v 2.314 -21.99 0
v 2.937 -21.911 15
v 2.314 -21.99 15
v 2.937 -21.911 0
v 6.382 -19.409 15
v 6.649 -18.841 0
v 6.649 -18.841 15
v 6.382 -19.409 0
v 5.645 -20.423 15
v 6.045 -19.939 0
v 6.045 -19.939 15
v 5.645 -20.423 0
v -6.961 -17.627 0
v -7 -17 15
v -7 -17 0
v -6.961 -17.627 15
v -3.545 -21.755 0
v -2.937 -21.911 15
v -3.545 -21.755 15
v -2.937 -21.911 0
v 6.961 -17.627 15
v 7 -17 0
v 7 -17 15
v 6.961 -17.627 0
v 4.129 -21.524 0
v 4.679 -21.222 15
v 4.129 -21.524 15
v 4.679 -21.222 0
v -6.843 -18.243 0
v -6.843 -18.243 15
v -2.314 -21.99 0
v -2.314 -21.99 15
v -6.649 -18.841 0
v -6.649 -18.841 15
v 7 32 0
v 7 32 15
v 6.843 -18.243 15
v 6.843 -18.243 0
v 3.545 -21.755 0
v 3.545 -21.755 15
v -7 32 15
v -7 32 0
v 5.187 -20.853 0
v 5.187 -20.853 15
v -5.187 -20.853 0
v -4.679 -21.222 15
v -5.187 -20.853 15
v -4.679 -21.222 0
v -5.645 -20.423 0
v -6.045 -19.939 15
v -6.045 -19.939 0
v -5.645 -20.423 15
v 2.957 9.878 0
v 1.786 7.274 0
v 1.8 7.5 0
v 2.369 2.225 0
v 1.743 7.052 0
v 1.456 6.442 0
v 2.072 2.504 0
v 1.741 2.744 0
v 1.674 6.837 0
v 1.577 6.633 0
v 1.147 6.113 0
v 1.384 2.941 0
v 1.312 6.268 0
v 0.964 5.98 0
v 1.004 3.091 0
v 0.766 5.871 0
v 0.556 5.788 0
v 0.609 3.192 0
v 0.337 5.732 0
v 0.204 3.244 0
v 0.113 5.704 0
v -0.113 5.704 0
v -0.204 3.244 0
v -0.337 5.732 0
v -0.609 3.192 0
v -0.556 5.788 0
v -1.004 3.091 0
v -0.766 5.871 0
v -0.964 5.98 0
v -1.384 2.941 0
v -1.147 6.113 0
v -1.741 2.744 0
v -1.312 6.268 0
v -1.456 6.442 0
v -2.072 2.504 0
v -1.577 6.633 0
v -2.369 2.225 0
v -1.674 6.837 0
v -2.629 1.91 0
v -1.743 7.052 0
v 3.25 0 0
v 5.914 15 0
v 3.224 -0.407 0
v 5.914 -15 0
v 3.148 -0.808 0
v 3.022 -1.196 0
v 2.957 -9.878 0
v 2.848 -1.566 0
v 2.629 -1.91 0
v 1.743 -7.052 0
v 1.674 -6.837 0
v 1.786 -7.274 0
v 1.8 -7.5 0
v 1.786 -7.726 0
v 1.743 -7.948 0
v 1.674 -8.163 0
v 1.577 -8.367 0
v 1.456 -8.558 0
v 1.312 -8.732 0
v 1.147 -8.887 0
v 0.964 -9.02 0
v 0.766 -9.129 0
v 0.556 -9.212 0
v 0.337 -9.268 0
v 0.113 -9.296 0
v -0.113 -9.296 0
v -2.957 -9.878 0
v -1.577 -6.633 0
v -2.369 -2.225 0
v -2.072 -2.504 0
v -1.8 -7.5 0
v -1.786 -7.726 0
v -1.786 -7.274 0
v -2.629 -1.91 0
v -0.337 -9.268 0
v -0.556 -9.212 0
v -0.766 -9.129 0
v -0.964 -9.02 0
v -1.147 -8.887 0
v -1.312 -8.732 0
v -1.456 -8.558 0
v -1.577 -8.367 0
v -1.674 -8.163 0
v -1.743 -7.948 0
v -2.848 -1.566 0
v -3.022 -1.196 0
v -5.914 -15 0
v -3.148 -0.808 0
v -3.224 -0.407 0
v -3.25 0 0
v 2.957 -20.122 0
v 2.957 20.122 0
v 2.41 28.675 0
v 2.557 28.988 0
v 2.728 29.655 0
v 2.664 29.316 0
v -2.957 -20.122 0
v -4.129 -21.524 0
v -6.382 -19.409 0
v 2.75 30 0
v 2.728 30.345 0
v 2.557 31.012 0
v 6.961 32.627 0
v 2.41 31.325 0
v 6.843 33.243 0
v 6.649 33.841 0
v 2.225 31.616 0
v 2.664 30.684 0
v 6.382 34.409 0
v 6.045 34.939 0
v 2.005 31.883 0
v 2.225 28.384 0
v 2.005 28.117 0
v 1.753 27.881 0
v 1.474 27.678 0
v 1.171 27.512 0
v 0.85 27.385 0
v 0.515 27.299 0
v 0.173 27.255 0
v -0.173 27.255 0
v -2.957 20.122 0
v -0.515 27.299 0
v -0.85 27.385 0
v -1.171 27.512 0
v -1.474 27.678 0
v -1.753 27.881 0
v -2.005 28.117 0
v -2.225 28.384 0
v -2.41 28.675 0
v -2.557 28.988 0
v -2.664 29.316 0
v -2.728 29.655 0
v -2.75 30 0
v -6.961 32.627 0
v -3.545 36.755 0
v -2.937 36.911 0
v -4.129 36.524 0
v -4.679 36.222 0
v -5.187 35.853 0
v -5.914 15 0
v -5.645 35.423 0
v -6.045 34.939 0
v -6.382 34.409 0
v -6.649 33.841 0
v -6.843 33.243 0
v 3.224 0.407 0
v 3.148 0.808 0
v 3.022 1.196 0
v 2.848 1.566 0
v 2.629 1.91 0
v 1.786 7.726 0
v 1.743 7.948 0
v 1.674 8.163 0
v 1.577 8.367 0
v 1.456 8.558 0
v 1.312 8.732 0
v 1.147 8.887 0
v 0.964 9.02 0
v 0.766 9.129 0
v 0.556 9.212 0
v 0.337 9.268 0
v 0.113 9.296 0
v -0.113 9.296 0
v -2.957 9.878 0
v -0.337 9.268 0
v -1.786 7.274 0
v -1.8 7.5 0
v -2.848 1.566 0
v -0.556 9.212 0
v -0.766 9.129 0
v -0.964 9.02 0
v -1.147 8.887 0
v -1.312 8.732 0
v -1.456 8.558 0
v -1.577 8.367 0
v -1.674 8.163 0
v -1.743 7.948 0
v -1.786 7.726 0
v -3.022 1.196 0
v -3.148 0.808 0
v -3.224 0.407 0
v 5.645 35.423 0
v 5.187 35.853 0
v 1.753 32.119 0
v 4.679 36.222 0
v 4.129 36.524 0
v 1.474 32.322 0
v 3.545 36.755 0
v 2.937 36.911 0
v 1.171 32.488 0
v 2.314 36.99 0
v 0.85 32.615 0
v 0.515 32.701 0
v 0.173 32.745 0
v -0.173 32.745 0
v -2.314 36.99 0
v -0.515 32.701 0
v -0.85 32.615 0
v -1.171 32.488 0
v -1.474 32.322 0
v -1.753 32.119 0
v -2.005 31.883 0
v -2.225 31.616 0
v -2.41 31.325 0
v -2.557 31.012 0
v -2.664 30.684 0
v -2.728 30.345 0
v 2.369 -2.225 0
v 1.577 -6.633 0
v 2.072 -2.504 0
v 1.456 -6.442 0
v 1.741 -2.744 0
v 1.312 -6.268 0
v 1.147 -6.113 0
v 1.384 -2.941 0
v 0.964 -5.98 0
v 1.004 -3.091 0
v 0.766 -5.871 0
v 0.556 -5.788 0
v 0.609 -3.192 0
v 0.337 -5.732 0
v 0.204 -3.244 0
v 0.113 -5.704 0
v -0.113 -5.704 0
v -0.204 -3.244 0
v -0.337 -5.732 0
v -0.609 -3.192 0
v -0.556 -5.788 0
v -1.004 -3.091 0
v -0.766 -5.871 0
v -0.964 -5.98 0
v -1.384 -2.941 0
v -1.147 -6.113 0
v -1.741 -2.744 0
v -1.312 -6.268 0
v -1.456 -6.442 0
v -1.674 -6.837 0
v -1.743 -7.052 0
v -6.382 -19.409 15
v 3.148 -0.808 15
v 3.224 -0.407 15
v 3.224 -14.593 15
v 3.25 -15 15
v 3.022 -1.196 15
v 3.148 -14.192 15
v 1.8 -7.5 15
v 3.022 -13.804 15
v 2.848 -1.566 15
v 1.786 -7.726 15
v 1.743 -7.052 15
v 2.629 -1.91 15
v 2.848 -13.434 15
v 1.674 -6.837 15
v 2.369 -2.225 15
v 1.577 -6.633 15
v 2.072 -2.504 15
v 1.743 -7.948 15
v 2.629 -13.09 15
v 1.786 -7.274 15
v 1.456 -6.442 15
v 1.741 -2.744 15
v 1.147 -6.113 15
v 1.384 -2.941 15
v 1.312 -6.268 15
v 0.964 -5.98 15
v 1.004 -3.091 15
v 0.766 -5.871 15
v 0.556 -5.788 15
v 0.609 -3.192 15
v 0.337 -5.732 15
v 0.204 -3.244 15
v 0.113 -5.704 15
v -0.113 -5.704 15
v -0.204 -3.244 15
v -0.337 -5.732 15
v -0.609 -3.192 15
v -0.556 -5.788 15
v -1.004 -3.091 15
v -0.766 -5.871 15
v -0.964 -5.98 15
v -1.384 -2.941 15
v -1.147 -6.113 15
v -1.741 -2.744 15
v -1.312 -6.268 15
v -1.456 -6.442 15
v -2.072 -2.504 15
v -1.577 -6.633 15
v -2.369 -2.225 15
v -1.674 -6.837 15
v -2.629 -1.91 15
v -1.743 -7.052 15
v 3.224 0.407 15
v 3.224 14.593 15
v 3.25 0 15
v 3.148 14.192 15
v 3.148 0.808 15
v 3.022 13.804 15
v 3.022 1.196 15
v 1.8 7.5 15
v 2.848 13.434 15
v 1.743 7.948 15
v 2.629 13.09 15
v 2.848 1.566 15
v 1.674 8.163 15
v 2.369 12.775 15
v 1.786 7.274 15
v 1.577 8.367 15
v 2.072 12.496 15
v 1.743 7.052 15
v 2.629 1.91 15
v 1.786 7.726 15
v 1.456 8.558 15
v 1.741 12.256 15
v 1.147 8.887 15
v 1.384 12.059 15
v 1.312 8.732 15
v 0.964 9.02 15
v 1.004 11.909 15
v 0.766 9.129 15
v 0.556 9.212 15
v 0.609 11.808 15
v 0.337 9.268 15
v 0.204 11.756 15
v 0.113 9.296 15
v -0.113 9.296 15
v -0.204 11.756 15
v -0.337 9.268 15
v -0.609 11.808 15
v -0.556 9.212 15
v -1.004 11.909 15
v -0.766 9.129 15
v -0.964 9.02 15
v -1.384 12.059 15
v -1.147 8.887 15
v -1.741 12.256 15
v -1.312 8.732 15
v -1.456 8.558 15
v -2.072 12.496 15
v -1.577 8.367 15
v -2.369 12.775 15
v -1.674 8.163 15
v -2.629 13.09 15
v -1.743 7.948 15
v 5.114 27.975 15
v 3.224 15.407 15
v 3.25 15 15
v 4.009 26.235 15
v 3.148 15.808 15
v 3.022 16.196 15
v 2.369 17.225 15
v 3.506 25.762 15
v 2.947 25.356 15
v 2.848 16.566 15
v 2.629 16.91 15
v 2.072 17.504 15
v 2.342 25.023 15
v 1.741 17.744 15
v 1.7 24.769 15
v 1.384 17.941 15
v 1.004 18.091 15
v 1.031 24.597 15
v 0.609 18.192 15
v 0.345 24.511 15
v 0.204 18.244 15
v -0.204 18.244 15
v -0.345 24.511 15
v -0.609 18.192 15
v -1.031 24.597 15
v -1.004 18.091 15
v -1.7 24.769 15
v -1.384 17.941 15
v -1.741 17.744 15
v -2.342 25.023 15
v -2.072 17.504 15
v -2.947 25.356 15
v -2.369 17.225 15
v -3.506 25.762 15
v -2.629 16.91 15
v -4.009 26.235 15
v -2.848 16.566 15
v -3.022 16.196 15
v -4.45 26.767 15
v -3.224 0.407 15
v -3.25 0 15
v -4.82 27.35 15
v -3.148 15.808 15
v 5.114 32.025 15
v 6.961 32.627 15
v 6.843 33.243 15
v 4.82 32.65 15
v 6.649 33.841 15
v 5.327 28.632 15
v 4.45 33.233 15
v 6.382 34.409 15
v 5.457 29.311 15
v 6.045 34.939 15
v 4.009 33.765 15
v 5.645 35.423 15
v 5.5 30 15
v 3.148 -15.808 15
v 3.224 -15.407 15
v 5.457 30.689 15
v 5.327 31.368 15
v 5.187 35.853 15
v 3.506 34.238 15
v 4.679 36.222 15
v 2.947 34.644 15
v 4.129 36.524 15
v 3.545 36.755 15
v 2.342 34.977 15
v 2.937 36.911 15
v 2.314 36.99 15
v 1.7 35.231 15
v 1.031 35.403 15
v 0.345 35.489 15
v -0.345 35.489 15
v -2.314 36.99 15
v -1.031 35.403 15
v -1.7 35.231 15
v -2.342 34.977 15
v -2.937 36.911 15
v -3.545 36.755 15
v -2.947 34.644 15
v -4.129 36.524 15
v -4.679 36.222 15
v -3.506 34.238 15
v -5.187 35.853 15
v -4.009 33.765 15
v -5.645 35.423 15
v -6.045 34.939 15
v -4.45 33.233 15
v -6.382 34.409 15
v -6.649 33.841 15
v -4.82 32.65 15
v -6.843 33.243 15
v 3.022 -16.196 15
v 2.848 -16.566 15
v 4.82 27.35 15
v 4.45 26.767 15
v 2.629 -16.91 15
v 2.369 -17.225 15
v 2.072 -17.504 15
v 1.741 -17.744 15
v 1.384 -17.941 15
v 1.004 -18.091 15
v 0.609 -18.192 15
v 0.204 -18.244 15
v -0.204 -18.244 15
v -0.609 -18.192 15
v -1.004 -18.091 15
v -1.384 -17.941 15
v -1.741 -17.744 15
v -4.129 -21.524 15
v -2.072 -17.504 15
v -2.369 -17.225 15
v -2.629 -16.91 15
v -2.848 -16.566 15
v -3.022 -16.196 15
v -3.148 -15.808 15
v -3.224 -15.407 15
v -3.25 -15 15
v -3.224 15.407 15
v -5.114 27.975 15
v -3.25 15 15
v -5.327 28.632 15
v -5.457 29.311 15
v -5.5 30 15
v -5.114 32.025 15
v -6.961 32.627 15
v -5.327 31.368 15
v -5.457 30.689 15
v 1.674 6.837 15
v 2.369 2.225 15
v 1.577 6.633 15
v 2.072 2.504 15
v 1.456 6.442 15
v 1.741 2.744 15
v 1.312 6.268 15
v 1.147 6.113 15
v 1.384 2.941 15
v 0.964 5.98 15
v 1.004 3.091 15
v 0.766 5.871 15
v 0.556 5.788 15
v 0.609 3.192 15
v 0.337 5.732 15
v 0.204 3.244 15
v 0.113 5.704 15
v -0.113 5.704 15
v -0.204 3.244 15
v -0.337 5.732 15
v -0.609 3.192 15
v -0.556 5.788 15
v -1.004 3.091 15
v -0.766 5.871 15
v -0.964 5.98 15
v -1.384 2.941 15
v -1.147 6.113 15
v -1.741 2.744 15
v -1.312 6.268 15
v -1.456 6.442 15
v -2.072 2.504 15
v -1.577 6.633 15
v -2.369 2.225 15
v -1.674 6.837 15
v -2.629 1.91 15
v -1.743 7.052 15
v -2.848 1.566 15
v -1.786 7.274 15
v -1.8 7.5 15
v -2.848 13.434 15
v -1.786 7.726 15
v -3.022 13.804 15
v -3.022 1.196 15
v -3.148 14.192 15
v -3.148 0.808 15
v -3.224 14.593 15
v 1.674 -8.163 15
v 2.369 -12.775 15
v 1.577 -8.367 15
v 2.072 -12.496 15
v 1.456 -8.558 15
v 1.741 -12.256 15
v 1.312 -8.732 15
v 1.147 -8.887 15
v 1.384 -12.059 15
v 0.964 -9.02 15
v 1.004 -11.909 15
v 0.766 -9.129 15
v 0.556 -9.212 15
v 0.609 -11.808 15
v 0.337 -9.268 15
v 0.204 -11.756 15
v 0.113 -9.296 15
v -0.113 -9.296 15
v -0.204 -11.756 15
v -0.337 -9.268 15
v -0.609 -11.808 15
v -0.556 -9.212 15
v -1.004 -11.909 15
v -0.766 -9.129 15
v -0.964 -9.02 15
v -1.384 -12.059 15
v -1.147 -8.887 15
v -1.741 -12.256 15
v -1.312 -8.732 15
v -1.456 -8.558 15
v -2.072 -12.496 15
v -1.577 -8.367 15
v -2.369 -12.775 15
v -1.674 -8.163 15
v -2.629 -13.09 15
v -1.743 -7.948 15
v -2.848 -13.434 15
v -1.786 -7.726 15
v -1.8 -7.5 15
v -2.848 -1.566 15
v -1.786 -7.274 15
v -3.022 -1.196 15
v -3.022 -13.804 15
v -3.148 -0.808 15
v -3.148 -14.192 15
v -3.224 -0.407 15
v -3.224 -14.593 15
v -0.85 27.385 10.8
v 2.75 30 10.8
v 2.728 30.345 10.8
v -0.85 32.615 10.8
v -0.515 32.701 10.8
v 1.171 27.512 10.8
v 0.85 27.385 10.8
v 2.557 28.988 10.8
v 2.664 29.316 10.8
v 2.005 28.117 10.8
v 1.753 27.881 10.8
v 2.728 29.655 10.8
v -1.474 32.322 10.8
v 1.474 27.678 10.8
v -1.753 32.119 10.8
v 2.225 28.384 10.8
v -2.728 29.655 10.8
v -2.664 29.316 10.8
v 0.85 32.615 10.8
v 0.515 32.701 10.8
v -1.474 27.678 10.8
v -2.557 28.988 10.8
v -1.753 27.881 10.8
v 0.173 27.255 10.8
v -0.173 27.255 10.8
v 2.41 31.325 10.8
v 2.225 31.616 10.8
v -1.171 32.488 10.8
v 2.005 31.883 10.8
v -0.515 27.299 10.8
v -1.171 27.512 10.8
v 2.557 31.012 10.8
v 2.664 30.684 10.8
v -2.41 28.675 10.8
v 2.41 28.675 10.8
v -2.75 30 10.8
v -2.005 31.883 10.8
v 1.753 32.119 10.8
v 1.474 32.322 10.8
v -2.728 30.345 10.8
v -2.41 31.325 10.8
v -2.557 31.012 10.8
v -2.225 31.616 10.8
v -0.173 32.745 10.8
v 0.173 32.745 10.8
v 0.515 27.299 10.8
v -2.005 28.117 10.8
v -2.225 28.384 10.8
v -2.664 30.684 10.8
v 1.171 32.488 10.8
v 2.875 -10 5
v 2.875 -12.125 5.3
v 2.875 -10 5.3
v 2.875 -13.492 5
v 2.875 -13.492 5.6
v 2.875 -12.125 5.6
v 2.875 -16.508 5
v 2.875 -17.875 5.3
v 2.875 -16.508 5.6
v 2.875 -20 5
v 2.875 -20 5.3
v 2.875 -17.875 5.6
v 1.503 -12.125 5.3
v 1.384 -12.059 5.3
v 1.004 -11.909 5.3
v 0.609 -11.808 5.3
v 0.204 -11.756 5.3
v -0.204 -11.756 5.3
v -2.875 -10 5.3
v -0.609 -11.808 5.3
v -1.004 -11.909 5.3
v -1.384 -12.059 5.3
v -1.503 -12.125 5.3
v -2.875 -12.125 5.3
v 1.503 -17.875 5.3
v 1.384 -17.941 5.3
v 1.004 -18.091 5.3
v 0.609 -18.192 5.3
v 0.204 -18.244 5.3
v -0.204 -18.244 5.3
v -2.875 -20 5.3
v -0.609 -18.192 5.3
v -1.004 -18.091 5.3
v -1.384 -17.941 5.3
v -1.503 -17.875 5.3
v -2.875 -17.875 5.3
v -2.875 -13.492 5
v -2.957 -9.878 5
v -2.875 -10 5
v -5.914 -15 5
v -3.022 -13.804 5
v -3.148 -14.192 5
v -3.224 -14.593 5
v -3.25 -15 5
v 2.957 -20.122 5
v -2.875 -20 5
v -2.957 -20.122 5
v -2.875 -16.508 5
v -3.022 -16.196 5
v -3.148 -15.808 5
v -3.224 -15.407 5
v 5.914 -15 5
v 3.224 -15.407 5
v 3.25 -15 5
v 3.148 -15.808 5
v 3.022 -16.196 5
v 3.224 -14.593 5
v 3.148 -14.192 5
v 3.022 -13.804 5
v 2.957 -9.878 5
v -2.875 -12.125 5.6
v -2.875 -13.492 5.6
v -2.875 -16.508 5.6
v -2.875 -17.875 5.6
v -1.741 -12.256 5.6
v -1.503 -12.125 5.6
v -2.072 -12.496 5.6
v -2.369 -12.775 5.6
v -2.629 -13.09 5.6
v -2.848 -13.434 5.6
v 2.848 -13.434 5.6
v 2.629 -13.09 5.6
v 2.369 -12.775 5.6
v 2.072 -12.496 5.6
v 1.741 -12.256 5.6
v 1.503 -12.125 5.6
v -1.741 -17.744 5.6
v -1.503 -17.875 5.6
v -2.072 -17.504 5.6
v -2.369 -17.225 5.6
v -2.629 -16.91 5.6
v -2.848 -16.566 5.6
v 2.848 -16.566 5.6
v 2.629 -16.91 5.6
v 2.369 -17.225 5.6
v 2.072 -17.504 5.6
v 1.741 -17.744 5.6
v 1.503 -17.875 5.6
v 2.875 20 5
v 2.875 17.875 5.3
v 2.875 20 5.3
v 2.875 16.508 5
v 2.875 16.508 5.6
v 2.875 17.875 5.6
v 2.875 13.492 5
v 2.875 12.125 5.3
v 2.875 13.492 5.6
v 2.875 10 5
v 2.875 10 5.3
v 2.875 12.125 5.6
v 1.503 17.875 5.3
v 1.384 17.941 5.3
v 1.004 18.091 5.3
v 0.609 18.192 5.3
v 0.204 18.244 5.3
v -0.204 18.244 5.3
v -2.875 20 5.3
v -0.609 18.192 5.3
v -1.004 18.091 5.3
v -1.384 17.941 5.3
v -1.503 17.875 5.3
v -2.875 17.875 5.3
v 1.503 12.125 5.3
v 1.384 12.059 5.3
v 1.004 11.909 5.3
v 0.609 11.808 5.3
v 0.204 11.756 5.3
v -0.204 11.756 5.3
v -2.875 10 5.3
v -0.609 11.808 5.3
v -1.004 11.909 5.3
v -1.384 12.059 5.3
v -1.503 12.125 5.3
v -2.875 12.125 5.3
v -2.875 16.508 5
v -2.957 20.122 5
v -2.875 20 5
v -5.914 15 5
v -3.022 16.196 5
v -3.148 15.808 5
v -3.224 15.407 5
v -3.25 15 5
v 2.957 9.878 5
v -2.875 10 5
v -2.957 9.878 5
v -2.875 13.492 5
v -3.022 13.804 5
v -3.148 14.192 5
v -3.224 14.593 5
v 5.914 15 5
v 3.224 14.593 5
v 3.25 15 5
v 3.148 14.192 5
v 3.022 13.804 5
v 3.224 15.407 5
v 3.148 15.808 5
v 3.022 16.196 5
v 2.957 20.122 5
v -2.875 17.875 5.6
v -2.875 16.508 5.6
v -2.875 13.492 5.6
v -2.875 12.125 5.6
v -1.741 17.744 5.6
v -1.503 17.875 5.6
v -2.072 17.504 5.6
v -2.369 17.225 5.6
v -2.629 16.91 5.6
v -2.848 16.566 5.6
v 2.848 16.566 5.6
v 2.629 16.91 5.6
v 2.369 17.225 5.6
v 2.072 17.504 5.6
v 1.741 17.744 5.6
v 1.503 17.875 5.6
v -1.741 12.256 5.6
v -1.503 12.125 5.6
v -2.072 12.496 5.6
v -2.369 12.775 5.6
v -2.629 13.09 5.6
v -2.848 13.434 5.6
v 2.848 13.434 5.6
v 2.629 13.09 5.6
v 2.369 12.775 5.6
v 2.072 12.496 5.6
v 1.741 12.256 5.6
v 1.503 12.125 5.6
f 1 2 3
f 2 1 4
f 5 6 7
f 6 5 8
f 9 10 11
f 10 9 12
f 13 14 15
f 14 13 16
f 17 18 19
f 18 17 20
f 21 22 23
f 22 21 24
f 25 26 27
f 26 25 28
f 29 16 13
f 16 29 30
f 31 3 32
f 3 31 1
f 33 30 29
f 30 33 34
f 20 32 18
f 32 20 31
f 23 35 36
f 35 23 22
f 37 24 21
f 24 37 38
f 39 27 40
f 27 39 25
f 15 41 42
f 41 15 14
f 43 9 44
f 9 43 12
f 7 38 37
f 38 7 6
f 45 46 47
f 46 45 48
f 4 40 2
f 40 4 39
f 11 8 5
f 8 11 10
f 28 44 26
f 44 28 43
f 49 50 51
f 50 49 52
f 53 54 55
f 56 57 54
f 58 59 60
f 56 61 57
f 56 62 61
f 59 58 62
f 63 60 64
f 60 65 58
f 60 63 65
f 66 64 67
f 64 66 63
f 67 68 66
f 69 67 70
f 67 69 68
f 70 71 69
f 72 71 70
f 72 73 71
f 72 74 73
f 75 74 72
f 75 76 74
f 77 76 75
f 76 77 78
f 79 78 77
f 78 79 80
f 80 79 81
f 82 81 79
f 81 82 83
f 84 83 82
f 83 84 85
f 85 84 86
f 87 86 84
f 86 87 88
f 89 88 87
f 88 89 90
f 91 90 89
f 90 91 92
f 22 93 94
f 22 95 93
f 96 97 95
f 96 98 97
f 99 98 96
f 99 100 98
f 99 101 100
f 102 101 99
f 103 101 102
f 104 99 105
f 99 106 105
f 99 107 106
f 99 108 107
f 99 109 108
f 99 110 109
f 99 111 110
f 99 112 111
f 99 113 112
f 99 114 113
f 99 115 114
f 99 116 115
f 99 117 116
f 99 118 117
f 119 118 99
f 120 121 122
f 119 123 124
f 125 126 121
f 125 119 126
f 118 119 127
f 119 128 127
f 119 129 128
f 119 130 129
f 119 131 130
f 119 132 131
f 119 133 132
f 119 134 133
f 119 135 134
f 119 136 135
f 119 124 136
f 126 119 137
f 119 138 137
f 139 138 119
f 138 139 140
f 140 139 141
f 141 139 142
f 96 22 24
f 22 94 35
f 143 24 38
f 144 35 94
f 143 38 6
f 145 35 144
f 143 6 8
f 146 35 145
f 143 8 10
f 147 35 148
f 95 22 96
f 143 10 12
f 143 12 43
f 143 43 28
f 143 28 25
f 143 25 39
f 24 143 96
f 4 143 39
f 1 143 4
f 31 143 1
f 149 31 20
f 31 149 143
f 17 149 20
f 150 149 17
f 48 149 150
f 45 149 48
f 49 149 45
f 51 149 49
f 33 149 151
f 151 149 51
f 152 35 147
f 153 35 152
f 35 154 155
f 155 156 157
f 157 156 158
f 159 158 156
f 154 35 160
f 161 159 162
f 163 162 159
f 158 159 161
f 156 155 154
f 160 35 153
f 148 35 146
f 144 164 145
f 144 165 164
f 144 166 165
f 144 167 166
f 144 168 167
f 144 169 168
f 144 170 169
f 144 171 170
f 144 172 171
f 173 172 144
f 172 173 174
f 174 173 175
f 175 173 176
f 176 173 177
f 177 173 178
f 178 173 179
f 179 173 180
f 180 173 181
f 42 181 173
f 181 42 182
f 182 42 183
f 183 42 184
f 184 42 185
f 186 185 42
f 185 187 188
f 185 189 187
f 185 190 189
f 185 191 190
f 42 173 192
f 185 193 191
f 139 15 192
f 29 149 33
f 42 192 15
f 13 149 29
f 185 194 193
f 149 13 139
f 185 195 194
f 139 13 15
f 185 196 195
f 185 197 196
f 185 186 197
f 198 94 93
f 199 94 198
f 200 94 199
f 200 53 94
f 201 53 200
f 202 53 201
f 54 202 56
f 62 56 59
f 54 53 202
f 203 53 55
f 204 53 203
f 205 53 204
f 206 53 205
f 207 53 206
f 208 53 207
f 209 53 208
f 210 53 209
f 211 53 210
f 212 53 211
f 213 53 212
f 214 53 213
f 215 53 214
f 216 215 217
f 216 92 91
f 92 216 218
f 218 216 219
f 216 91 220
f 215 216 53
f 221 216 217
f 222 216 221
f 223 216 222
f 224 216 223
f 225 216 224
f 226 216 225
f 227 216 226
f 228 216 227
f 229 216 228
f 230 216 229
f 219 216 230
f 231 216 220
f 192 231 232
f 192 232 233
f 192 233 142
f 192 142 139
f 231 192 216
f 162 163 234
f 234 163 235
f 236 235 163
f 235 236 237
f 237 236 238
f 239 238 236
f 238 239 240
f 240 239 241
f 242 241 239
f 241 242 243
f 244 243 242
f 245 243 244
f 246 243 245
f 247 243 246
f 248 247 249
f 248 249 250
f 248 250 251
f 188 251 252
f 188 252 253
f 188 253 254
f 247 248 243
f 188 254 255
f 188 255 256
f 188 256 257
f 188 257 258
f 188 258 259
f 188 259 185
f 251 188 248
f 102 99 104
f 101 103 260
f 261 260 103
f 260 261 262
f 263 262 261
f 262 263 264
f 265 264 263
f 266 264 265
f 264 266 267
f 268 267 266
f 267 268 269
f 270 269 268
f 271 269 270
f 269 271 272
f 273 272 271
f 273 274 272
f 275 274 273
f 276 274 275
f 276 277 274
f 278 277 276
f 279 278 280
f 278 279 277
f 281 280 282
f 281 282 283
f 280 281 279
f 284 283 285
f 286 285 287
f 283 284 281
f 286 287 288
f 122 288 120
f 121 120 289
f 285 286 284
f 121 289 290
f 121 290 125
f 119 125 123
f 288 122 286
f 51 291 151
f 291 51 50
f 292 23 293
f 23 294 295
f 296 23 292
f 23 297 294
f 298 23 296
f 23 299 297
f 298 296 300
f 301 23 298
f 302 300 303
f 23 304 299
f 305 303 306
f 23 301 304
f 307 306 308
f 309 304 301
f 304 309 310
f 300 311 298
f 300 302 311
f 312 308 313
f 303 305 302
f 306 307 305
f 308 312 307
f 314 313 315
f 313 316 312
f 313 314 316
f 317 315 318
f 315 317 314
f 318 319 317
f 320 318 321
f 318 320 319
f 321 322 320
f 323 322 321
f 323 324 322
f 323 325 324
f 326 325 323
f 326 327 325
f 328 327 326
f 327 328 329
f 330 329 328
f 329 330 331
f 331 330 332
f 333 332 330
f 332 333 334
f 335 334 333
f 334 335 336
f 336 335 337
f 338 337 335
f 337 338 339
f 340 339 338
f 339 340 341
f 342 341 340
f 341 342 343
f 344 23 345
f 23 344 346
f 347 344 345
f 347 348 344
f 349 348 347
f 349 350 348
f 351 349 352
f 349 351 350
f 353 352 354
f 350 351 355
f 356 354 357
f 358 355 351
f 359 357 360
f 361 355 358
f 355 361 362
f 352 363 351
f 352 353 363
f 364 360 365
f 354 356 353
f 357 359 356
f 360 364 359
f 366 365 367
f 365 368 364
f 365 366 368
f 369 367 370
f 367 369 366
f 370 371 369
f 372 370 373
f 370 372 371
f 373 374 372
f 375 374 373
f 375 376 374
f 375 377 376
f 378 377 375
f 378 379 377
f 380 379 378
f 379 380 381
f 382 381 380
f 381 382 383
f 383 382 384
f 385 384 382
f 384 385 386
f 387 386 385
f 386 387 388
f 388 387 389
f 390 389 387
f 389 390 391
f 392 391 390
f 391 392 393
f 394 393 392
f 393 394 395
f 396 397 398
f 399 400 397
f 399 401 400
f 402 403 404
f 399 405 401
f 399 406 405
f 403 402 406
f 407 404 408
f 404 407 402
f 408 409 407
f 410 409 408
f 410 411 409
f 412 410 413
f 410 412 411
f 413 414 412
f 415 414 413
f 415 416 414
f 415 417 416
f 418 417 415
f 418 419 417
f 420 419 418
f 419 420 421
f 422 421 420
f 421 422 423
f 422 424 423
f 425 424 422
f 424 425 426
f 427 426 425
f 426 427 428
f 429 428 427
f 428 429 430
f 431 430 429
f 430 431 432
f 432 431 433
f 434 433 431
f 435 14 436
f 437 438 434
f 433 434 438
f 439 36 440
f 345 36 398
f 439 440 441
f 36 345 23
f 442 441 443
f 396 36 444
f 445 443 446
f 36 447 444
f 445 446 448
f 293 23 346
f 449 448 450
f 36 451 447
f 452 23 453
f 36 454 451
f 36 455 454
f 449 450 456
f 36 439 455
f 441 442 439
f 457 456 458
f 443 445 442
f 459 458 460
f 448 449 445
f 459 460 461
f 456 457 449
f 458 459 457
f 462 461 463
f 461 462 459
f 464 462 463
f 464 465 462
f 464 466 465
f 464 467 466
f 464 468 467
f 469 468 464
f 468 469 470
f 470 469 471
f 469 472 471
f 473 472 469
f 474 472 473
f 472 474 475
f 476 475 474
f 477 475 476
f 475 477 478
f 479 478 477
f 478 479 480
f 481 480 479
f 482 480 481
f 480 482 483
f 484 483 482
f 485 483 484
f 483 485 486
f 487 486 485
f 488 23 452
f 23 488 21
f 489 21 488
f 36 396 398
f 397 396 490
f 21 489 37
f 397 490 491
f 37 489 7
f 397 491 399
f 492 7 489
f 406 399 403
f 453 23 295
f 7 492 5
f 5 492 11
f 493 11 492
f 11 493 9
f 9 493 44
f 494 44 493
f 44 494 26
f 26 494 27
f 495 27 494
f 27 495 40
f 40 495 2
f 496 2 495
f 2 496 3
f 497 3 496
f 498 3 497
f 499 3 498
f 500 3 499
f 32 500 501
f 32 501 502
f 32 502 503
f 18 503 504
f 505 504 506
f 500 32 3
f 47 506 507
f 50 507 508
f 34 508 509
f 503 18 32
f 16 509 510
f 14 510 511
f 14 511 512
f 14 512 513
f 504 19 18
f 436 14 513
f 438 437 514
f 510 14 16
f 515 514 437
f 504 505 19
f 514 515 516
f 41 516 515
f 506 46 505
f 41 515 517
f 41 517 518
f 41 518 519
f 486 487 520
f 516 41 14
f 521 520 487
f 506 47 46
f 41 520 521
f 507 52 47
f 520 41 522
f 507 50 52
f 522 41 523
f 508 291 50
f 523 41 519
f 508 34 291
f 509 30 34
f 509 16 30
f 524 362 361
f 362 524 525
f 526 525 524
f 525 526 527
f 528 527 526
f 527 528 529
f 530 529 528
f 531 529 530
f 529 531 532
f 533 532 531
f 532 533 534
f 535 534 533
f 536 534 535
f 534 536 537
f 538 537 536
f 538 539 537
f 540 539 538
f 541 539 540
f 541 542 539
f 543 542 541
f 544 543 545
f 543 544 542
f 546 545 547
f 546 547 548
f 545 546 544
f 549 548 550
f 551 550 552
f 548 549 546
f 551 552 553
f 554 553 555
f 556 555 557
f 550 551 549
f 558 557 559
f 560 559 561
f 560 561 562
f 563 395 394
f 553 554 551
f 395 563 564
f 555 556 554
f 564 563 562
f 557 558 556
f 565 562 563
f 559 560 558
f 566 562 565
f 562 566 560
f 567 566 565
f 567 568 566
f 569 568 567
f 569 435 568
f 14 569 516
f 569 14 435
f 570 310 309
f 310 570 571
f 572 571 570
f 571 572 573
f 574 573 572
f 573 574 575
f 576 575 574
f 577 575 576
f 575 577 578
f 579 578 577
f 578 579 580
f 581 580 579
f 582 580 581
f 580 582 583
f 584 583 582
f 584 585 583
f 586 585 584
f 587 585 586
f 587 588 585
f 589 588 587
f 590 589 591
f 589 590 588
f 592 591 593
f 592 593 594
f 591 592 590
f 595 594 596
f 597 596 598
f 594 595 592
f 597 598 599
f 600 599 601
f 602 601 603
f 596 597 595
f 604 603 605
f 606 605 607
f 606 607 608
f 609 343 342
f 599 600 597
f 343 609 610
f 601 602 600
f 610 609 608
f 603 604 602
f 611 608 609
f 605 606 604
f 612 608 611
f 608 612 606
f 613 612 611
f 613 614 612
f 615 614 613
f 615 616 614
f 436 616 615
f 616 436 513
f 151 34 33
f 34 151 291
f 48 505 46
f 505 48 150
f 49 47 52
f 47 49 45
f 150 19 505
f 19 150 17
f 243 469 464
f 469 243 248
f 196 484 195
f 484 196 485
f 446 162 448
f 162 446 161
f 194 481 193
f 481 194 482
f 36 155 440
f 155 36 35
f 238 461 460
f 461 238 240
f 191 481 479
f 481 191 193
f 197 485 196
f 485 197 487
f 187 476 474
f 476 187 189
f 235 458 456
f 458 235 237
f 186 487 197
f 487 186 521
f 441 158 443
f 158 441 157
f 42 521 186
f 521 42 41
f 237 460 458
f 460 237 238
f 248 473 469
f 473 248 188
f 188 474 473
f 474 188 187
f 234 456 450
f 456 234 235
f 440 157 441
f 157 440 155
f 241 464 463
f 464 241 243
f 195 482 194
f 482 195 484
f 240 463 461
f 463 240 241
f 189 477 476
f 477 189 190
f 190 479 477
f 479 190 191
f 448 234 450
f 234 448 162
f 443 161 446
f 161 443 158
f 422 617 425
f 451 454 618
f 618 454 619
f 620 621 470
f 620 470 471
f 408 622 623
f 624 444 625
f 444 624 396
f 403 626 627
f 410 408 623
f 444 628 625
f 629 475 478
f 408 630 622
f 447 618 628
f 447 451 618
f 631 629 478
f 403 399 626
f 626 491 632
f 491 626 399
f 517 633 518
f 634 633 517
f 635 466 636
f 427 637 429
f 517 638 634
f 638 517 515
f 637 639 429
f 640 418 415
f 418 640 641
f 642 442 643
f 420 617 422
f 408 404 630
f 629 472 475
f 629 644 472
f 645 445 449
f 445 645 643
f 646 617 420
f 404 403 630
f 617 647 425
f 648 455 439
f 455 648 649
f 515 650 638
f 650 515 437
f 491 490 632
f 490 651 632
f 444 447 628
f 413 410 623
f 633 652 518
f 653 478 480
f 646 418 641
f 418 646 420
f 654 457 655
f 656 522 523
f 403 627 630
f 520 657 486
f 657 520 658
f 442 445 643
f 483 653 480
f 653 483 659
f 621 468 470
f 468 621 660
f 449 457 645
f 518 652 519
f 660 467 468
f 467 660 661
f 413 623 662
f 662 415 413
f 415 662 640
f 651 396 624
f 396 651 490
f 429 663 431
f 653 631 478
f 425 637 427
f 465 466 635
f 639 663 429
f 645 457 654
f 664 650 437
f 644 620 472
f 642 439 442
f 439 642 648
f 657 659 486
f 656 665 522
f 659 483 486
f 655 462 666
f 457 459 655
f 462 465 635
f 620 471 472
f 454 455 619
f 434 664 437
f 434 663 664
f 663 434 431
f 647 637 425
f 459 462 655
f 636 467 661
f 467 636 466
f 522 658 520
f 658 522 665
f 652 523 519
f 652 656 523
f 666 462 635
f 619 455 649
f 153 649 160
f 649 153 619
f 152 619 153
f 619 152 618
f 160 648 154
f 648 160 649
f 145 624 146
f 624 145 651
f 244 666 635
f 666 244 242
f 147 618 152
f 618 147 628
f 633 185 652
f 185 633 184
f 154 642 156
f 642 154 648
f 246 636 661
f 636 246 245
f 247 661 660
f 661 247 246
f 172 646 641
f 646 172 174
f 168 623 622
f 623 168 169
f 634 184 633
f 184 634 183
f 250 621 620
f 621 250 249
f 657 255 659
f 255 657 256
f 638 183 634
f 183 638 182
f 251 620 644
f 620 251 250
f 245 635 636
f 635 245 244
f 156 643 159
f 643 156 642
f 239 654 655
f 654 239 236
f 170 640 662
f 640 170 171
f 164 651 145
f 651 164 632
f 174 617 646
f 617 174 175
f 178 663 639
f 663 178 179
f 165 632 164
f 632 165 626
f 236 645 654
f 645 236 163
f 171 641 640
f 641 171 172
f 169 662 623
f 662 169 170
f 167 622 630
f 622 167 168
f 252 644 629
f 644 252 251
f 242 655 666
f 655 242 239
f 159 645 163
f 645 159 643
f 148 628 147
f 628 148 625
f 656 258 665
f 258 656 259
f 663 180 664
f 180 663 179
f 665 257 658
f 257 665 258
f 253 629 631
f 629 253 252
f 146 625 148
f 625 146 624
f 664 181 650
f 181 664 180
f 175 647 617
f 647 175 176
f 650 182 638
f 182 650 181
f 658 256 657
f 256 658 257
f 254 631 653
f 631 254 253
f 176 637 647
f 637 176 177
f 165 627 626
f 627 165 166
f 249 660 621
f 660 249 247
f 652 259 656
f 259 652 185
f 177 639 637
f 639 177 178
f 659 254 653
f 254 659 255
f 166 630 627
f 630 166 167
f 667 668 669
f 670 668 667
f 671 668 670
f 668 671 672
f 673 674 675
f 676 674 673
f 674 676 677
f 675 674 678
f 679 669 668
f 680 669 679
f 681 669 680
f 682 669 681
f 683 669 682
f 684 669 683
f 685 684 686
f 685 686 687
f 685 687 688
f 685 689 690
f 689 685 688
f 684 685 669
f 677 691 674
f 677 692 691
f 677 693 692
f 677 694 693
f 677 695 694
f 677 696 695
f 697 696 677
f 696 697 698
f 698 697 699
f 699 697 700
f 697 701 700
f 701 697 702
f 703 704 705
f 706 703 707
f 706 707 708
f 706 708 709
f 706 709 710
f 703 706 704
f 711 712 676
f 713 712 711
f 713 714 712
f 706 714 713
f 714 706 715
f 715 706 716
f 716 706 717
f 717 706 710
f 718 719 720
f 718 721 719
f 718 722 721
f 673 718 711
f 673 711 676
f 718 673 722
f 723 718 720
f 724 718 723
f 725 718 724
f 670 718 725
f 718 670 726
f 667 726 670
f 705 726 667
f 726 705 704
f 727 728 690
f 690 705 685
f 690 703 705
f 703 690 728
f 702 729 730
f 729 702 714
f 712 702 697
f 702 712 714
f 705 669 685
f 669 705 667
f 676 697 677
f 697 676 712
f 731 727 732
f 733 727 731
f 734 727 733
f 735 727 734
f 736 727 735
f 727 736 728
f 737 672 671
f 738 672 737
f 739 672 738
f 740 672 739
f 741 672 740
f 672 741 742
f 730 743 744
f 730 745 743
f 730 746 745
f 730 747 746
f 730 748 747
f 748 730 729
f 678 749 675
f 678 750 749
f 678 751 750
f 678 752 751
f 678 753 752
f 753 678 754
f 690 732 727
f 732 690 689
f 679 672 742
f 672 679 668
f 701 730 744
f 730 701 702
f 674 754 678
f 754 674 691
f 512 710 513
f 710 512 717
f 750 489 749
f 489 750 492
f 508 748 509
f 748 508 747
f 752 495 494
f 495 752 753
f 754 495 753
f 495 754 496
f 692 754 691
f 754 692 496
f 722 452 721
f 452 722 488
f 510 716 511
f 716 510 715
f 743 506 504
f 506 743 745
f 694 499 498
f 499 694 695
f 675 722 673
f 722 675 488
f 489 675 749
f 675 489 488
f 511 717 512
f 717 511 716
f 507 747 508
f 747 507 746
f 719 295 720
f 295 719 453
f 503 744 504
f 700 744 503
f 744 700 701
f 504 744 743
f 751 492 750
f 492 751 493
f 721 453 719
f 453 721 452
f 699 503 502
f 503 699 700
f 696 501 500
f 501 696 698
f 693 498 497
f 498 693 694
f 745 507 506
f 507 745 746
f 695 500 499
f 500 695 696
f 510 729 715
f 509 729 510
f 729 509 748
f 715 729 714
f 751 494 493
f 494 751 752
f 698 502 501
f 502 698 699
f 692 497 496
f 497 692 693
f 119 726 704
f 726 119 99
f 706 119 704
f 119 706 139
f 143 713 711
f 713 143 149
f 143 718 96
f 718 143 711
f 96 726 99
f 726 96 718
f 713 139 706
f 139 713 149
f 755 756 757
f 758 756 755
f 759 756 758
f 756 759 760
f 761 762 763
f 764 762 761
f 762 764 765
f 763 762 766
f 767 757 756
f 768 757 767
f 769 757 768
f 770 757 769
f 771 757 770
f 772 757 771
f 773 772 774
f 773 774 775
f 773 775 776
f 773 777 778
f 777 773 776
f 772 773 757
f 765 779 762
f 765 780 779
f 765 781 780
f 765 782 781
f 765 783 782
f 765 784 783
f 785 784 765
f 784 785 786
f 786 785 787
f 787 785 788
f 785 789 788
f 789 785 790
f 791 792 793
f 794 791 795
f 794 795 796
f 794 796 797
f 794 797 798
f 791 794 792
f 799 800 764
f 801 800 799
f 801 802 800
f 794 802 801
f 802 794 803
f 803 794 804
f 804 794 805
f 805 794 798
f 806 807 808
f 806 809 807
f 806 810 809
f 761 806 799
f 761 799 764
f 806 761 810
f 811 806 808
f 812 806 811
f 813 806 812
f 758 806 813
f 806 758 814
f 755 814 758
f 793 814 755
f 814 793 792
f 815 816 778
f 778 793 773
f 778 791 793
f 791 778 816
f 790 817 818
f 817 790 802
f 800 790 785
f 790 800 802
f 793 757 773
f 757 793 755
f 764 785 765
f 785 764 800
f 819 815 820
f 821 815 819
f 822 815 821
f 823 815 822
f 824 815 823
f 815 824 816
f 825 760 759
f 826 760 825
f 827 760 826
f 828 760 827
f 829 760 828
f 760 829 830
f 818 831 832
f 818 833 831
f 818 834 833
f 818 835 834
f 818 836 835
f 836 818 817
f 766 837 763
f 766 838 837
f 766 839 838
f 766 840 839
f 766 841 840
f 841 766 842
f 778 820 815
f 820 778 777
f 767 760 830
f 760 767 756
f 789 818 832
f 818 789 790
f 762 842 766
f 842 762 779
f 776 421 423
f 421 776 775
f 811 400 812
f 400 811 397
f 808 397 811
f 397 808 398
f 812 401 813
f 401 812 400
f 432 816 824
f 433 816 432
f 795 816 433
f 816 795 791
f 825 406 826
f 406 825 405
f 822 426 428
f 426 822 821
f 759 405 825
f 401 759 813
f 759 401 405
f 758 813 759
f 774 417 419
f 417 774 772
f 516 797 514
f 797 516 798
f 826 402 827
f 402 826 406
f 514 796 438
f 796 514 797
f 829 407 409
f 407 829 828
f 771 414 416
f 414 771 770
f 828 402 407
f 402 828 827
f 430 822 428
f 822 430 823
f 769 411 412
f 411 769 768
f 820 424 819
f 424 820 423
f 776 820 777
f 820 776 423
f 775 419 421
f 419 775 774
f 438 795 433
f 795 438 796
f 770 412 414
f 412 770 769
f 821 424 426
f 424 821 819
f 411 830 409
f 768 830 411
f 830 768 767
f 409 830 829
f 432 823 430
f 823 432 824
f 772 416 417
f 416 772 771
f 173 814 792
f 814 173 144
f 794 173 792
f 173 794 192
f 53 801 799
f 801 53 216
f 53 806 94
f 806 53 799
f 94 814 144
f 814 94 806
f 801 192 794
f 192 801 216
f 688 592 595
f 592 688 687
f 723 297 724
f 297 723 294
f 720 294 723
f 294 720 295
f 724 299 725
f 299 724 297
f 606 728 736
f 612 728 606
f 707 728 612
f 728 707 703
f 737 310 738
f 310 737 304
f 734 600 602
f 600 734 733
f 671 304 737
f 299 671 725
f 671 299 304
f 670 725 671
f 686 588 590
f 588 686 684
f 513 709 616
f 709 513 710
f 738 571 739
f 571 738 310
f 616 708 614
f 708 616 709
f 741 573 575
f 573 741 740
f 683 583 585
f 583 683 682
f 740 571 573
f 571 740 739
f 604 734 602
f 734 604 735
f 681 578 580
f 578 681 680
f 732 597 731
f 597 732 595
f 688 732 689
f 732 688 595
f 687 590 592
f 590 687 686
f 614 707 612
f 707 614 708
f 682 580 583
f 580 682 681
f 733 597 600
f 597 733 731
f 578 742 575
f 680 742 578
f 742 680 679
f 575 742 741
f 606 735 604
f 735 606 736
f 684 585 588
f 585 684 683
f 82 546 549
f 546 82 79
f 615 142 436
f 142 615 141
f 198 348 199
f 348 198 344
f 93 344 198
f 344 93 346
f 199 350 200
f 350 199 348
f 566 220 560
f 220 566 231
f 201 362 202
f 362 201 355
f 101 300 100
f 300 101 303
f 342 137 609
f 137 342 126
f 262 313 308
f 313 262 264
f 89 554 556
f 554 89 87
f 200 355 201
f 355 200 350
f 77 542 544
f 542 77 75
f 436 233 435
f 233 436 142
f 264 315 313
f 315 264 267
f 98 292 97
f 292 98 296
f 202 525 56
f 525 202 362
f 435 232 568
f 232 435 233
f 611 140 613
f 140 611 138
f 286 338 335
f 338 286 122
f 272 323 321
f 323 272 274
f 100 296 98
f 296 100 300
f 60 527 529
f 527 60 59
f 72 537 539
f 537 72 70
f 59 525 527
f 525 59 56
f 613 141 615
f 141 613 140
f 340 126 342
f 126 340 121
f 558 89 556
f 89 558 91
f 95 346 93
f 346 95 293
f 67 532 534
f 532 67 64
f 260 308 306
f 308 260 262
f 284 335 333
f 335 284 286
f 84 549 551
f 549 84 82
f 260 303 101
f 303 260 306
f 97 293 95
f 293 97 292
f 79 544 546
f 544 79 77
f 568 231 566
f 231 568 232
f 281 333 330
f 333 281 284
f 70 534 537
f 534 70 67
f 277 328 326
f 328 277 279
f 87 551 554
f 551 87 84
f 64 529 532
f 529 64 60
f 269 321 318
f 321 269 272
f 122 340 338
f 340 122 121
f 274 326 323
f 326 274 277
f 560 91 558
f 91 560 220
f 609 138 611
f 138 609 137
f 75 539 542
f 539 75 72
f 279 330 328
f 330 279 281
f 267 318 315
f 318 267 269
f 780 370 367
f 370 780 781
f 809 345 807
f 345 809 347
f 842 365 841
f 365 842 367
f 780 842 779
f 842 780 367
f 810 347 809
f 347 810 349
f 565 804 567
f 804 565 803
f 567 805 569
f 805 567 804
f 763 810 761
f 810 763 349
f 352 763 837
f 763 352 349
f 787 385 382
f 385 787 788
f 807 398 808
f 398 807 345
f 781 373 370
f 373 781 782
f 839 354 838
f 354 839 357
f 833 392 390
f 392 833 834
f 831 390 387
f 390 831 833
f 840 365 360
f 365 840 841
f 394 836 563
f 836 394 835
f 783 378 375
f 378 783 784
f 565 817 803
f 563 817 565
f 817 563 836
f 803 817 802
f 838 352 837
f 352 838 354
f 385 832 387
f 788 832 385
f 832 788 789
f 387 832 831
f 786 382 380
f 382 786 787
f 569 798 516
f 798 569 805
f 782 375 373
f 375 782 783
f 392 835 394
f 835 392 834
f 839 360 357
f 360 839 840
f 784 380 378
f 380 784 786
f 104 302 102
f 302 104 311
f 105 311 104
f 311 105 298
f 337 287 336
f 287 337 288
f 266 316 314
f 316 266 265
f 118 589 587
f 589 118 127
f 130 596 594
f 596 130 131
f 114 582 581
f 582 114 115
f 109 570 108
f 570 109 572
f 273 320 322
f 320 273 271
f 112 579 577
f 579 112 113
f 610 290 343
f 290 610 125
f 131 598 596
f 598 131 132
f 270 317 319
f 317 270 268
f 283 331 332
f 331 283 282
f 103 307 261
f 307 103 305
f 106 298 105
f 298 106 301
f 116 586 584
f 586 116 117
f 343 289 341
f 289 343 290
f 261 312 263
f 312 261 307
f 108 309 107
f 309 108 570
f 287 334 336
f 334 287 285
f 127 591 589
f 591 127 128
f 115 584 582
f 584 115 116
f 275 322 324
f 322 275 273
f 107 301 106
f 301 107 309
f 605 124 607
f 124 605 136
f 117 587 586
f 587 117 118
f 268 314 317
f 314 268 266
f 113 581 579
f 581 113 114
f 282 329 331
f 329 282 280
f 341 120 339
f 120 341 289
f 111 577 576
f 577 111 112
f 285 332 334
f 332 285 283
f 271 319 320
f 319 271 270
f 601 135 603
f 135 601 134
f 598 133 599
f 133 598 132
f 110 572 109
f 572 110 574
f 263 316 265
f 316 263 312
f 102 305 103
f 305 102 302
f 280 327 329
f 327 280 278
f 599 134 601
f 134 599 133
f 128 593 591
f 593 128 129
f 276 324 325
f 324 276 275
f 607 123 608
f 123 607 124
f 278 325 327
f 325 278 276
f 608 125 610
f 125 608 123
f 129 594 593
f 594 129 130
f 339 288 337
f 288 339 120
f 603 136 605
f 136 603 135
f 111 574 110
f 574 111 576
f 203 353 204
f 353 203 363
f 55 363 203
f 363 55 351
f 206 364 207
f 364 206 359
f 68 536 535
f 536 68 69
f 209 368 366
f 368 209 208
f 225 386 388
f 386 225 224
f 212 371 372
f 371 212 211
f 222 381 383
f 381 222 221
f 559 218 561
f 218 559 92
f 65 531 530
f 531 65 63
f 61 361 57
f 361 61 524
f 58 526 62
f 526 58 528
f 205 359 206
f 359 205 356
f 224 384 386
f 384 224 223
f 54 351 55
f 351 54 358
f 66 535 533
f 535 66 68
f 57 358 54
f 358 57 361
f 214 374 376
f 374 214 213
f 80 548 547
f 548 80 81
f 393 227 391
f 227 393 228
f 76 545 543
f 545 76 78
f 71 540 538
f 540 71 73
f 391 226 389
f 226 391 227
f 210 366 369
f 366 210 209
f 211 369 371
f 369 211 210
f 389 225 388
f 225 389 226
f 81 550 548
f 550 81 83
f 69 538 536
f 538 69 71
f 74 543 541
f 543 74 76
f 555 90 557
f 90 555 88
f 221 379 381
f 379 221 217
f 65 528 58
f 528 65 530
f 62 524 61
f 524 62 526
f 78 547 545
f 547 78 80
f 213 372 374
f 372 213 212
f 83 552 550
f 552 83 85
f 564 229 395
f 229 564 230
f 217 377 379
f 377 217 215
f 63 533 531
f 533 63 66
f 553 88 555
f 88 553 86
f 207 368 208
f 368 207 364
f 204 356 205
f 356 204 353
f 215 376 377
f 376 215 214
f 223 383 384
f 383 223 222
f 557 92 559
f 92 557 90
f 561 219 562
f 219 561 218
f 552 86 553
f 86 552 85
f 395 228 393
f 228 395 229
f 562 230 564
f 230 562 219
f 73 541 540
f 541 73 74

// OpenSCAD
$fn = 50;


difference() {
	union() {
		hull() {
			translate(v = [-2.0000000000, 17.0000000000, 0]) {
				cylinder(h = 15, r = 5);
			}
			translate(v = [2.0000000000, 17.0000000000, 0]) {
				cylinder(h = 15, r = 5);
			}
			translate(v = [-2.0000000000, -17.0000000000, 0]) {
				cylinder(h = 15, r = 5);
			}
			translate(v = [2.0000000000, -17.0000000000, 0]) {
				cylinder(h = 15, r = 5);
			}
		}
		translate(v = [0.0000000000, 22.5000000000, 0]) {
			hull() {
				translate(v = [-2.0000000000, 9.5000000000, 0]) {
					cylinder(h = 15, r = 5);
				}
				translate(v = [2.0000000000, 9.5000000000, 0]) {
					cylinder(h = 15, r = 5);
				}
				translate(v = [-2.0000000000, -9.5000000000, 0]) {
					cylinder(h = 15, r = 5);
				}
				translate(v = [2.0000000000, -9.5000000000, 0]) {
					cylinder(h = 15, r = 5);
				}
			}
		}
		translate(v = [0.0000000000, 22.5000000000, 0]) {
			hull() {
				translate(v = [-2.0000000000, 9.5000000000, 0]) {
					cylinder(h = 15, r = 5);
				}
				translate(v = [2.0000000000, 9.5000000000, 0]) {
					cylinder(h = 15, r = 5);
				}
				translate(v = [-2.0000000000, -9.5000000000, 0]) {
					cylinder(h = 15, r = 5);
				}
				translate(v = [2.0000000000, -9.5000000000, 0]) {
					cylinder(h = 15, r = 5);
				}
			}
		}
	}
	union() {
		translate(v = [0.0000000000, 30.0000000000, 15]) {
			rotate(a = [0, 0, 0]) {
				difference() {
					union() {
						#translate(v = [0, 0, -15.0000000000]) {
							cylinder(h = 15, r = 2.2500000000);
						}
						#translate(v = [0, 0, -4.2000000000]) {
							cylinder(h = 4.2000000000, r1 = 2.7500000000, r2 = 5.5000000000);
						}
						#translate(v = [0, 0, -15.0000000000]) {
							cylinder(h = 15, r = 2.7500000000);
						}
						#translate(v = [0, 0, -15.0000000000]) {
							cylinder(h = 15, r = 2.2500000000);
						}
					}
					union();
				}
			}
		}
		translate(v = [0.0000000000, 30.0000000000, 15]) {
			rotate(a = [0, 0, 0]) {
				difference() {
					union() {
						#translate(v = [0, 0, -15.0000000000]) {
							cylinder(h = 15, r = 2.2500000000);
						}
						#translate(v = [0, 0, -4.2000000000]) {
							cylinder(h = 4.2000000000, r1 = 2.7500000000, r2 = 5.5000000000);
						}
						#translate(v = [0, 0, -15.0000000000]) {
							cylinder(h = 15, r = 2.7500000000);
						}
						#translate(v = [0, 0, -15.0000000000]) {
							cylinder(h = 15, r = 2.2500000000);
						}
					}
					union();
				}
			}
		}
		translate(v = [0.0000000000, -15.0000000000, 0]) {
			rotate(a = [0, 0, 0]) {
				difference() {
					union() {
						#translate(v = [-2.8750000000, -5.0000000000, -0.3000000000]) {
							cube(size = [5.7500000000, 10, 0.3000000000]);
						}
						#translate(v = [-2.8750000000, -2.8750000000, -0.6000000000]) {
							cube(size = [5.7500000000, 5.7500000000, 0.3000000000]);
						}
						#translate(v = [-2.8750000000, -5.0000000000, 5]) {
							cube(size = [5.7500000000, 10, 0.3000000000]);
						}
						#translate(v = [-2.8750000000, -2.8750000000, 5.3000000000]) {
							cube(size = [5.7500000000, 5.7500000000, 0.3000000000]);
						}
						#translate(v = [0, 0, -100.0000000000]) {
							cylinder(h = 200, r = 3.2500000000);
						}
						#linear_extrude(height = 5) {
							polygon(points = [[5.9142500000, 0.0000000000], [2.9571250000, 5.1218907443], [-2.9571250000, 5.1218907443], [-5.9142500000, 0.0000000000], [-2.9571250000, -5.1218907443], [2.9571250000, -5.1218907443]]);
						}
						#translate(v = [-2.8750000000, -5.0000000000, -0.3000000000]) {
							cube(size = [5.7500000000, 10, 0.3000000000]);
						}
						#translate(v = [-2.8750000000, -2.8750000000, -0.6000000000]) {
							cube(size = [5.7500000000, 5.7500000000, 0.3000000000]);
						}
						#translate(v = [-2.8750000000, -5.0000000000, 5]) {
							cube(size = [5.7500000000, 10, 0.3000000000]);
						}
						#translate(v = [-2.8750000000, -2.8750000000, 5.3000000000]) {
							cube(size = [5.7500000000, 5.7500000000, 0.3000000000]);
						}
						#translate(v = [0, 0, -100.0000000000]) {
							cylinder(h = 200, r = 3.2500000000);
						}
						#translate(v = [-2.8750000000, -5.0000000000, -0.3000000000]) {
							cube(size = [5.7500000000, 10, 0.3000000000]);
						}
						#translate(v = [-2.8750000000, -2.8750000000, -0.6000000000]) {
							cube(size = [5.7500000000, 5.7500000000, 0.3000000000]);
						}
						#translate(v = [-2.8750000000, -5.0000000000, 5]) {
							cube(size = [5.7500000000, 10, 0.3000000000]);
						}
						#translate(v = [-2.8750000000, -2.8750000000, 5.3000000000]) {
							cube(size = [5.7500000000, 5.7500000000, 0.3000000000]);
						}
						#translate(v = [0, 0, -100.0000000000]) {
							cylinder(h = 200, r = 3.2500000000);
						}
					}
					union();
				}
			}
		}
		translate(v = [0.0000000000, 15.0000000000, 0]) {
			rotate(a = [0, 0, 0]) {
				difference() {
					union() {
						#translate(v = [-2.8750000000, -5.0000000000, -0.3000000000]) {
							cube(size = [5.7500000000, 10, 0.3000000000]);
						}
						#translate(v = [-2.8750000000, -2.8750000000, -0.6000000000]) {
							cube(size = [5.7500000000, 5.7500000000, 0.3000000000]);
						}
						#translate(v = [-2.8750000000, -5.0000000000, 5]) {
							cube(size = [5.7500000000, 10, 0.3000000000]);
						}
						#translate(v = [-2.8750000000, -2.8750000000, 5.3000000000]) {
							cube(size = [5.7500000000, 5.7500000000, 0.3000000000]);
						}
						#translate(v = [0, 0, -100.0000000000]) {
							cylinder(h = 200, r = 3.2500000000);
						}
						#linear_extrude(height = 5) {
							polygon(points = [[5.9142500000, 0.0000000000], [2.9571250000, 5.1218907443], [-2.9571250000, 5.1218907443], [-5.9142500000, 0.0000000000], [-2.9571250000, -5.1218907443], [2.9571250000, -5.1218907443]]);
						}
						#translate(v = [-2.8750000000, -5.0000000000, -0.3000000000]) {
							cube(size = [5.7500000000, 10, 0.3000000000]);
						}
						#translate(v = [-2.8750000000, -2.8750000000, -0.6000000000]) {
							cube(size = [5.7500000000, 5.7500000000, 0.3000000000]);
						}
						#translate(v = [-2.8750000000, -5.0000000000, 5]) {
							cube(size = [5.7500000000, 10, 0.3000000000]);
						}
						#translate(v = [-2.8750000000, -2.8750000000, 5.3000000000]) {
							cube(size = [5.7500000000, 5.7500000000, 0.3000000000]);
						}
						#translate(v = [0, 0, -100.0000000000]) {
							cylinder(h = 200, r = 3.2500000000);
						}
						#translate(v = [-2.8750000000, -5.0000000000, -0.3000000000]) {
							cube(size = [5.7500000000, 10, 0.3000000000]);
						}
						#translate(v = [-2.8750000000, -2.8750000000, -0.6000000000]) {
							cube(size = [5.7500000000, 5.7500000000, 0.3000000000]);
						}
						#translate(v = [-2.8750000000, -5.0000000000, 5]) {
							cube(size = [5.7500000000, 10, 0.3000000000]);
						}
						#translate(v = [-2.8750000000, -2.8750000000, 5.3000000000]) {
							cube(size = [5.7500000000, 5.7500000000, 0.3000000000]);
						}
						#translate(v = [0, 0, -100.0000000000]) {
							cylinder(h = 200, r = 3.2500000000);
						}
					}
					union();
				}
			}
		}
		translate(v = [0.0000000000, -15.0000000000, 0]) {
			translate(v = [0, 0, -100]) {
				cylinder(h = 200, r = 3.2500000000);
			}
		}
		translate(v = [0, 0, -100]) {
			cylinder(h = 200, r = 3.2500000000);
		}
		translate(v = [0.0000000000, 15.0000000000, 0]) {
			translate(v = [0, 0, -100]) {
				cylinder(h = 200, r = 3.2500000000);
			}
		}
		translate(v = [0.0000000000, -15.0000000000, 0]) {
			translate(v = [0, 0, -100]) {
				cylinder(h = 200, r = 1.8000000000);
			}
		}
		translate(v = [0.0000000000, -7.5000000000, 0]) {
			translate(v = [0, 0, -100]) {
				cylinder(h = 200, r = 1.8000000000);
			}
		}
		translate(v = [0, 0, -100]) {
			cylinder(h = 200, r = 1.8000000000);
		}
		translate(v = [0.0000000000, 7.5000000000, 0]) {
			translate(v = [0, 0, -100]) {
				cylinder(h = 200, r = 1.8000000000);
			}
		}
		translate(v = [0.0000000000, 15.0000000000, 0]) {
			translate(v = [0, 0, -100]) {
				cylinder(h = 200, r = 1.8000000000);
			}
		}
	}
}
